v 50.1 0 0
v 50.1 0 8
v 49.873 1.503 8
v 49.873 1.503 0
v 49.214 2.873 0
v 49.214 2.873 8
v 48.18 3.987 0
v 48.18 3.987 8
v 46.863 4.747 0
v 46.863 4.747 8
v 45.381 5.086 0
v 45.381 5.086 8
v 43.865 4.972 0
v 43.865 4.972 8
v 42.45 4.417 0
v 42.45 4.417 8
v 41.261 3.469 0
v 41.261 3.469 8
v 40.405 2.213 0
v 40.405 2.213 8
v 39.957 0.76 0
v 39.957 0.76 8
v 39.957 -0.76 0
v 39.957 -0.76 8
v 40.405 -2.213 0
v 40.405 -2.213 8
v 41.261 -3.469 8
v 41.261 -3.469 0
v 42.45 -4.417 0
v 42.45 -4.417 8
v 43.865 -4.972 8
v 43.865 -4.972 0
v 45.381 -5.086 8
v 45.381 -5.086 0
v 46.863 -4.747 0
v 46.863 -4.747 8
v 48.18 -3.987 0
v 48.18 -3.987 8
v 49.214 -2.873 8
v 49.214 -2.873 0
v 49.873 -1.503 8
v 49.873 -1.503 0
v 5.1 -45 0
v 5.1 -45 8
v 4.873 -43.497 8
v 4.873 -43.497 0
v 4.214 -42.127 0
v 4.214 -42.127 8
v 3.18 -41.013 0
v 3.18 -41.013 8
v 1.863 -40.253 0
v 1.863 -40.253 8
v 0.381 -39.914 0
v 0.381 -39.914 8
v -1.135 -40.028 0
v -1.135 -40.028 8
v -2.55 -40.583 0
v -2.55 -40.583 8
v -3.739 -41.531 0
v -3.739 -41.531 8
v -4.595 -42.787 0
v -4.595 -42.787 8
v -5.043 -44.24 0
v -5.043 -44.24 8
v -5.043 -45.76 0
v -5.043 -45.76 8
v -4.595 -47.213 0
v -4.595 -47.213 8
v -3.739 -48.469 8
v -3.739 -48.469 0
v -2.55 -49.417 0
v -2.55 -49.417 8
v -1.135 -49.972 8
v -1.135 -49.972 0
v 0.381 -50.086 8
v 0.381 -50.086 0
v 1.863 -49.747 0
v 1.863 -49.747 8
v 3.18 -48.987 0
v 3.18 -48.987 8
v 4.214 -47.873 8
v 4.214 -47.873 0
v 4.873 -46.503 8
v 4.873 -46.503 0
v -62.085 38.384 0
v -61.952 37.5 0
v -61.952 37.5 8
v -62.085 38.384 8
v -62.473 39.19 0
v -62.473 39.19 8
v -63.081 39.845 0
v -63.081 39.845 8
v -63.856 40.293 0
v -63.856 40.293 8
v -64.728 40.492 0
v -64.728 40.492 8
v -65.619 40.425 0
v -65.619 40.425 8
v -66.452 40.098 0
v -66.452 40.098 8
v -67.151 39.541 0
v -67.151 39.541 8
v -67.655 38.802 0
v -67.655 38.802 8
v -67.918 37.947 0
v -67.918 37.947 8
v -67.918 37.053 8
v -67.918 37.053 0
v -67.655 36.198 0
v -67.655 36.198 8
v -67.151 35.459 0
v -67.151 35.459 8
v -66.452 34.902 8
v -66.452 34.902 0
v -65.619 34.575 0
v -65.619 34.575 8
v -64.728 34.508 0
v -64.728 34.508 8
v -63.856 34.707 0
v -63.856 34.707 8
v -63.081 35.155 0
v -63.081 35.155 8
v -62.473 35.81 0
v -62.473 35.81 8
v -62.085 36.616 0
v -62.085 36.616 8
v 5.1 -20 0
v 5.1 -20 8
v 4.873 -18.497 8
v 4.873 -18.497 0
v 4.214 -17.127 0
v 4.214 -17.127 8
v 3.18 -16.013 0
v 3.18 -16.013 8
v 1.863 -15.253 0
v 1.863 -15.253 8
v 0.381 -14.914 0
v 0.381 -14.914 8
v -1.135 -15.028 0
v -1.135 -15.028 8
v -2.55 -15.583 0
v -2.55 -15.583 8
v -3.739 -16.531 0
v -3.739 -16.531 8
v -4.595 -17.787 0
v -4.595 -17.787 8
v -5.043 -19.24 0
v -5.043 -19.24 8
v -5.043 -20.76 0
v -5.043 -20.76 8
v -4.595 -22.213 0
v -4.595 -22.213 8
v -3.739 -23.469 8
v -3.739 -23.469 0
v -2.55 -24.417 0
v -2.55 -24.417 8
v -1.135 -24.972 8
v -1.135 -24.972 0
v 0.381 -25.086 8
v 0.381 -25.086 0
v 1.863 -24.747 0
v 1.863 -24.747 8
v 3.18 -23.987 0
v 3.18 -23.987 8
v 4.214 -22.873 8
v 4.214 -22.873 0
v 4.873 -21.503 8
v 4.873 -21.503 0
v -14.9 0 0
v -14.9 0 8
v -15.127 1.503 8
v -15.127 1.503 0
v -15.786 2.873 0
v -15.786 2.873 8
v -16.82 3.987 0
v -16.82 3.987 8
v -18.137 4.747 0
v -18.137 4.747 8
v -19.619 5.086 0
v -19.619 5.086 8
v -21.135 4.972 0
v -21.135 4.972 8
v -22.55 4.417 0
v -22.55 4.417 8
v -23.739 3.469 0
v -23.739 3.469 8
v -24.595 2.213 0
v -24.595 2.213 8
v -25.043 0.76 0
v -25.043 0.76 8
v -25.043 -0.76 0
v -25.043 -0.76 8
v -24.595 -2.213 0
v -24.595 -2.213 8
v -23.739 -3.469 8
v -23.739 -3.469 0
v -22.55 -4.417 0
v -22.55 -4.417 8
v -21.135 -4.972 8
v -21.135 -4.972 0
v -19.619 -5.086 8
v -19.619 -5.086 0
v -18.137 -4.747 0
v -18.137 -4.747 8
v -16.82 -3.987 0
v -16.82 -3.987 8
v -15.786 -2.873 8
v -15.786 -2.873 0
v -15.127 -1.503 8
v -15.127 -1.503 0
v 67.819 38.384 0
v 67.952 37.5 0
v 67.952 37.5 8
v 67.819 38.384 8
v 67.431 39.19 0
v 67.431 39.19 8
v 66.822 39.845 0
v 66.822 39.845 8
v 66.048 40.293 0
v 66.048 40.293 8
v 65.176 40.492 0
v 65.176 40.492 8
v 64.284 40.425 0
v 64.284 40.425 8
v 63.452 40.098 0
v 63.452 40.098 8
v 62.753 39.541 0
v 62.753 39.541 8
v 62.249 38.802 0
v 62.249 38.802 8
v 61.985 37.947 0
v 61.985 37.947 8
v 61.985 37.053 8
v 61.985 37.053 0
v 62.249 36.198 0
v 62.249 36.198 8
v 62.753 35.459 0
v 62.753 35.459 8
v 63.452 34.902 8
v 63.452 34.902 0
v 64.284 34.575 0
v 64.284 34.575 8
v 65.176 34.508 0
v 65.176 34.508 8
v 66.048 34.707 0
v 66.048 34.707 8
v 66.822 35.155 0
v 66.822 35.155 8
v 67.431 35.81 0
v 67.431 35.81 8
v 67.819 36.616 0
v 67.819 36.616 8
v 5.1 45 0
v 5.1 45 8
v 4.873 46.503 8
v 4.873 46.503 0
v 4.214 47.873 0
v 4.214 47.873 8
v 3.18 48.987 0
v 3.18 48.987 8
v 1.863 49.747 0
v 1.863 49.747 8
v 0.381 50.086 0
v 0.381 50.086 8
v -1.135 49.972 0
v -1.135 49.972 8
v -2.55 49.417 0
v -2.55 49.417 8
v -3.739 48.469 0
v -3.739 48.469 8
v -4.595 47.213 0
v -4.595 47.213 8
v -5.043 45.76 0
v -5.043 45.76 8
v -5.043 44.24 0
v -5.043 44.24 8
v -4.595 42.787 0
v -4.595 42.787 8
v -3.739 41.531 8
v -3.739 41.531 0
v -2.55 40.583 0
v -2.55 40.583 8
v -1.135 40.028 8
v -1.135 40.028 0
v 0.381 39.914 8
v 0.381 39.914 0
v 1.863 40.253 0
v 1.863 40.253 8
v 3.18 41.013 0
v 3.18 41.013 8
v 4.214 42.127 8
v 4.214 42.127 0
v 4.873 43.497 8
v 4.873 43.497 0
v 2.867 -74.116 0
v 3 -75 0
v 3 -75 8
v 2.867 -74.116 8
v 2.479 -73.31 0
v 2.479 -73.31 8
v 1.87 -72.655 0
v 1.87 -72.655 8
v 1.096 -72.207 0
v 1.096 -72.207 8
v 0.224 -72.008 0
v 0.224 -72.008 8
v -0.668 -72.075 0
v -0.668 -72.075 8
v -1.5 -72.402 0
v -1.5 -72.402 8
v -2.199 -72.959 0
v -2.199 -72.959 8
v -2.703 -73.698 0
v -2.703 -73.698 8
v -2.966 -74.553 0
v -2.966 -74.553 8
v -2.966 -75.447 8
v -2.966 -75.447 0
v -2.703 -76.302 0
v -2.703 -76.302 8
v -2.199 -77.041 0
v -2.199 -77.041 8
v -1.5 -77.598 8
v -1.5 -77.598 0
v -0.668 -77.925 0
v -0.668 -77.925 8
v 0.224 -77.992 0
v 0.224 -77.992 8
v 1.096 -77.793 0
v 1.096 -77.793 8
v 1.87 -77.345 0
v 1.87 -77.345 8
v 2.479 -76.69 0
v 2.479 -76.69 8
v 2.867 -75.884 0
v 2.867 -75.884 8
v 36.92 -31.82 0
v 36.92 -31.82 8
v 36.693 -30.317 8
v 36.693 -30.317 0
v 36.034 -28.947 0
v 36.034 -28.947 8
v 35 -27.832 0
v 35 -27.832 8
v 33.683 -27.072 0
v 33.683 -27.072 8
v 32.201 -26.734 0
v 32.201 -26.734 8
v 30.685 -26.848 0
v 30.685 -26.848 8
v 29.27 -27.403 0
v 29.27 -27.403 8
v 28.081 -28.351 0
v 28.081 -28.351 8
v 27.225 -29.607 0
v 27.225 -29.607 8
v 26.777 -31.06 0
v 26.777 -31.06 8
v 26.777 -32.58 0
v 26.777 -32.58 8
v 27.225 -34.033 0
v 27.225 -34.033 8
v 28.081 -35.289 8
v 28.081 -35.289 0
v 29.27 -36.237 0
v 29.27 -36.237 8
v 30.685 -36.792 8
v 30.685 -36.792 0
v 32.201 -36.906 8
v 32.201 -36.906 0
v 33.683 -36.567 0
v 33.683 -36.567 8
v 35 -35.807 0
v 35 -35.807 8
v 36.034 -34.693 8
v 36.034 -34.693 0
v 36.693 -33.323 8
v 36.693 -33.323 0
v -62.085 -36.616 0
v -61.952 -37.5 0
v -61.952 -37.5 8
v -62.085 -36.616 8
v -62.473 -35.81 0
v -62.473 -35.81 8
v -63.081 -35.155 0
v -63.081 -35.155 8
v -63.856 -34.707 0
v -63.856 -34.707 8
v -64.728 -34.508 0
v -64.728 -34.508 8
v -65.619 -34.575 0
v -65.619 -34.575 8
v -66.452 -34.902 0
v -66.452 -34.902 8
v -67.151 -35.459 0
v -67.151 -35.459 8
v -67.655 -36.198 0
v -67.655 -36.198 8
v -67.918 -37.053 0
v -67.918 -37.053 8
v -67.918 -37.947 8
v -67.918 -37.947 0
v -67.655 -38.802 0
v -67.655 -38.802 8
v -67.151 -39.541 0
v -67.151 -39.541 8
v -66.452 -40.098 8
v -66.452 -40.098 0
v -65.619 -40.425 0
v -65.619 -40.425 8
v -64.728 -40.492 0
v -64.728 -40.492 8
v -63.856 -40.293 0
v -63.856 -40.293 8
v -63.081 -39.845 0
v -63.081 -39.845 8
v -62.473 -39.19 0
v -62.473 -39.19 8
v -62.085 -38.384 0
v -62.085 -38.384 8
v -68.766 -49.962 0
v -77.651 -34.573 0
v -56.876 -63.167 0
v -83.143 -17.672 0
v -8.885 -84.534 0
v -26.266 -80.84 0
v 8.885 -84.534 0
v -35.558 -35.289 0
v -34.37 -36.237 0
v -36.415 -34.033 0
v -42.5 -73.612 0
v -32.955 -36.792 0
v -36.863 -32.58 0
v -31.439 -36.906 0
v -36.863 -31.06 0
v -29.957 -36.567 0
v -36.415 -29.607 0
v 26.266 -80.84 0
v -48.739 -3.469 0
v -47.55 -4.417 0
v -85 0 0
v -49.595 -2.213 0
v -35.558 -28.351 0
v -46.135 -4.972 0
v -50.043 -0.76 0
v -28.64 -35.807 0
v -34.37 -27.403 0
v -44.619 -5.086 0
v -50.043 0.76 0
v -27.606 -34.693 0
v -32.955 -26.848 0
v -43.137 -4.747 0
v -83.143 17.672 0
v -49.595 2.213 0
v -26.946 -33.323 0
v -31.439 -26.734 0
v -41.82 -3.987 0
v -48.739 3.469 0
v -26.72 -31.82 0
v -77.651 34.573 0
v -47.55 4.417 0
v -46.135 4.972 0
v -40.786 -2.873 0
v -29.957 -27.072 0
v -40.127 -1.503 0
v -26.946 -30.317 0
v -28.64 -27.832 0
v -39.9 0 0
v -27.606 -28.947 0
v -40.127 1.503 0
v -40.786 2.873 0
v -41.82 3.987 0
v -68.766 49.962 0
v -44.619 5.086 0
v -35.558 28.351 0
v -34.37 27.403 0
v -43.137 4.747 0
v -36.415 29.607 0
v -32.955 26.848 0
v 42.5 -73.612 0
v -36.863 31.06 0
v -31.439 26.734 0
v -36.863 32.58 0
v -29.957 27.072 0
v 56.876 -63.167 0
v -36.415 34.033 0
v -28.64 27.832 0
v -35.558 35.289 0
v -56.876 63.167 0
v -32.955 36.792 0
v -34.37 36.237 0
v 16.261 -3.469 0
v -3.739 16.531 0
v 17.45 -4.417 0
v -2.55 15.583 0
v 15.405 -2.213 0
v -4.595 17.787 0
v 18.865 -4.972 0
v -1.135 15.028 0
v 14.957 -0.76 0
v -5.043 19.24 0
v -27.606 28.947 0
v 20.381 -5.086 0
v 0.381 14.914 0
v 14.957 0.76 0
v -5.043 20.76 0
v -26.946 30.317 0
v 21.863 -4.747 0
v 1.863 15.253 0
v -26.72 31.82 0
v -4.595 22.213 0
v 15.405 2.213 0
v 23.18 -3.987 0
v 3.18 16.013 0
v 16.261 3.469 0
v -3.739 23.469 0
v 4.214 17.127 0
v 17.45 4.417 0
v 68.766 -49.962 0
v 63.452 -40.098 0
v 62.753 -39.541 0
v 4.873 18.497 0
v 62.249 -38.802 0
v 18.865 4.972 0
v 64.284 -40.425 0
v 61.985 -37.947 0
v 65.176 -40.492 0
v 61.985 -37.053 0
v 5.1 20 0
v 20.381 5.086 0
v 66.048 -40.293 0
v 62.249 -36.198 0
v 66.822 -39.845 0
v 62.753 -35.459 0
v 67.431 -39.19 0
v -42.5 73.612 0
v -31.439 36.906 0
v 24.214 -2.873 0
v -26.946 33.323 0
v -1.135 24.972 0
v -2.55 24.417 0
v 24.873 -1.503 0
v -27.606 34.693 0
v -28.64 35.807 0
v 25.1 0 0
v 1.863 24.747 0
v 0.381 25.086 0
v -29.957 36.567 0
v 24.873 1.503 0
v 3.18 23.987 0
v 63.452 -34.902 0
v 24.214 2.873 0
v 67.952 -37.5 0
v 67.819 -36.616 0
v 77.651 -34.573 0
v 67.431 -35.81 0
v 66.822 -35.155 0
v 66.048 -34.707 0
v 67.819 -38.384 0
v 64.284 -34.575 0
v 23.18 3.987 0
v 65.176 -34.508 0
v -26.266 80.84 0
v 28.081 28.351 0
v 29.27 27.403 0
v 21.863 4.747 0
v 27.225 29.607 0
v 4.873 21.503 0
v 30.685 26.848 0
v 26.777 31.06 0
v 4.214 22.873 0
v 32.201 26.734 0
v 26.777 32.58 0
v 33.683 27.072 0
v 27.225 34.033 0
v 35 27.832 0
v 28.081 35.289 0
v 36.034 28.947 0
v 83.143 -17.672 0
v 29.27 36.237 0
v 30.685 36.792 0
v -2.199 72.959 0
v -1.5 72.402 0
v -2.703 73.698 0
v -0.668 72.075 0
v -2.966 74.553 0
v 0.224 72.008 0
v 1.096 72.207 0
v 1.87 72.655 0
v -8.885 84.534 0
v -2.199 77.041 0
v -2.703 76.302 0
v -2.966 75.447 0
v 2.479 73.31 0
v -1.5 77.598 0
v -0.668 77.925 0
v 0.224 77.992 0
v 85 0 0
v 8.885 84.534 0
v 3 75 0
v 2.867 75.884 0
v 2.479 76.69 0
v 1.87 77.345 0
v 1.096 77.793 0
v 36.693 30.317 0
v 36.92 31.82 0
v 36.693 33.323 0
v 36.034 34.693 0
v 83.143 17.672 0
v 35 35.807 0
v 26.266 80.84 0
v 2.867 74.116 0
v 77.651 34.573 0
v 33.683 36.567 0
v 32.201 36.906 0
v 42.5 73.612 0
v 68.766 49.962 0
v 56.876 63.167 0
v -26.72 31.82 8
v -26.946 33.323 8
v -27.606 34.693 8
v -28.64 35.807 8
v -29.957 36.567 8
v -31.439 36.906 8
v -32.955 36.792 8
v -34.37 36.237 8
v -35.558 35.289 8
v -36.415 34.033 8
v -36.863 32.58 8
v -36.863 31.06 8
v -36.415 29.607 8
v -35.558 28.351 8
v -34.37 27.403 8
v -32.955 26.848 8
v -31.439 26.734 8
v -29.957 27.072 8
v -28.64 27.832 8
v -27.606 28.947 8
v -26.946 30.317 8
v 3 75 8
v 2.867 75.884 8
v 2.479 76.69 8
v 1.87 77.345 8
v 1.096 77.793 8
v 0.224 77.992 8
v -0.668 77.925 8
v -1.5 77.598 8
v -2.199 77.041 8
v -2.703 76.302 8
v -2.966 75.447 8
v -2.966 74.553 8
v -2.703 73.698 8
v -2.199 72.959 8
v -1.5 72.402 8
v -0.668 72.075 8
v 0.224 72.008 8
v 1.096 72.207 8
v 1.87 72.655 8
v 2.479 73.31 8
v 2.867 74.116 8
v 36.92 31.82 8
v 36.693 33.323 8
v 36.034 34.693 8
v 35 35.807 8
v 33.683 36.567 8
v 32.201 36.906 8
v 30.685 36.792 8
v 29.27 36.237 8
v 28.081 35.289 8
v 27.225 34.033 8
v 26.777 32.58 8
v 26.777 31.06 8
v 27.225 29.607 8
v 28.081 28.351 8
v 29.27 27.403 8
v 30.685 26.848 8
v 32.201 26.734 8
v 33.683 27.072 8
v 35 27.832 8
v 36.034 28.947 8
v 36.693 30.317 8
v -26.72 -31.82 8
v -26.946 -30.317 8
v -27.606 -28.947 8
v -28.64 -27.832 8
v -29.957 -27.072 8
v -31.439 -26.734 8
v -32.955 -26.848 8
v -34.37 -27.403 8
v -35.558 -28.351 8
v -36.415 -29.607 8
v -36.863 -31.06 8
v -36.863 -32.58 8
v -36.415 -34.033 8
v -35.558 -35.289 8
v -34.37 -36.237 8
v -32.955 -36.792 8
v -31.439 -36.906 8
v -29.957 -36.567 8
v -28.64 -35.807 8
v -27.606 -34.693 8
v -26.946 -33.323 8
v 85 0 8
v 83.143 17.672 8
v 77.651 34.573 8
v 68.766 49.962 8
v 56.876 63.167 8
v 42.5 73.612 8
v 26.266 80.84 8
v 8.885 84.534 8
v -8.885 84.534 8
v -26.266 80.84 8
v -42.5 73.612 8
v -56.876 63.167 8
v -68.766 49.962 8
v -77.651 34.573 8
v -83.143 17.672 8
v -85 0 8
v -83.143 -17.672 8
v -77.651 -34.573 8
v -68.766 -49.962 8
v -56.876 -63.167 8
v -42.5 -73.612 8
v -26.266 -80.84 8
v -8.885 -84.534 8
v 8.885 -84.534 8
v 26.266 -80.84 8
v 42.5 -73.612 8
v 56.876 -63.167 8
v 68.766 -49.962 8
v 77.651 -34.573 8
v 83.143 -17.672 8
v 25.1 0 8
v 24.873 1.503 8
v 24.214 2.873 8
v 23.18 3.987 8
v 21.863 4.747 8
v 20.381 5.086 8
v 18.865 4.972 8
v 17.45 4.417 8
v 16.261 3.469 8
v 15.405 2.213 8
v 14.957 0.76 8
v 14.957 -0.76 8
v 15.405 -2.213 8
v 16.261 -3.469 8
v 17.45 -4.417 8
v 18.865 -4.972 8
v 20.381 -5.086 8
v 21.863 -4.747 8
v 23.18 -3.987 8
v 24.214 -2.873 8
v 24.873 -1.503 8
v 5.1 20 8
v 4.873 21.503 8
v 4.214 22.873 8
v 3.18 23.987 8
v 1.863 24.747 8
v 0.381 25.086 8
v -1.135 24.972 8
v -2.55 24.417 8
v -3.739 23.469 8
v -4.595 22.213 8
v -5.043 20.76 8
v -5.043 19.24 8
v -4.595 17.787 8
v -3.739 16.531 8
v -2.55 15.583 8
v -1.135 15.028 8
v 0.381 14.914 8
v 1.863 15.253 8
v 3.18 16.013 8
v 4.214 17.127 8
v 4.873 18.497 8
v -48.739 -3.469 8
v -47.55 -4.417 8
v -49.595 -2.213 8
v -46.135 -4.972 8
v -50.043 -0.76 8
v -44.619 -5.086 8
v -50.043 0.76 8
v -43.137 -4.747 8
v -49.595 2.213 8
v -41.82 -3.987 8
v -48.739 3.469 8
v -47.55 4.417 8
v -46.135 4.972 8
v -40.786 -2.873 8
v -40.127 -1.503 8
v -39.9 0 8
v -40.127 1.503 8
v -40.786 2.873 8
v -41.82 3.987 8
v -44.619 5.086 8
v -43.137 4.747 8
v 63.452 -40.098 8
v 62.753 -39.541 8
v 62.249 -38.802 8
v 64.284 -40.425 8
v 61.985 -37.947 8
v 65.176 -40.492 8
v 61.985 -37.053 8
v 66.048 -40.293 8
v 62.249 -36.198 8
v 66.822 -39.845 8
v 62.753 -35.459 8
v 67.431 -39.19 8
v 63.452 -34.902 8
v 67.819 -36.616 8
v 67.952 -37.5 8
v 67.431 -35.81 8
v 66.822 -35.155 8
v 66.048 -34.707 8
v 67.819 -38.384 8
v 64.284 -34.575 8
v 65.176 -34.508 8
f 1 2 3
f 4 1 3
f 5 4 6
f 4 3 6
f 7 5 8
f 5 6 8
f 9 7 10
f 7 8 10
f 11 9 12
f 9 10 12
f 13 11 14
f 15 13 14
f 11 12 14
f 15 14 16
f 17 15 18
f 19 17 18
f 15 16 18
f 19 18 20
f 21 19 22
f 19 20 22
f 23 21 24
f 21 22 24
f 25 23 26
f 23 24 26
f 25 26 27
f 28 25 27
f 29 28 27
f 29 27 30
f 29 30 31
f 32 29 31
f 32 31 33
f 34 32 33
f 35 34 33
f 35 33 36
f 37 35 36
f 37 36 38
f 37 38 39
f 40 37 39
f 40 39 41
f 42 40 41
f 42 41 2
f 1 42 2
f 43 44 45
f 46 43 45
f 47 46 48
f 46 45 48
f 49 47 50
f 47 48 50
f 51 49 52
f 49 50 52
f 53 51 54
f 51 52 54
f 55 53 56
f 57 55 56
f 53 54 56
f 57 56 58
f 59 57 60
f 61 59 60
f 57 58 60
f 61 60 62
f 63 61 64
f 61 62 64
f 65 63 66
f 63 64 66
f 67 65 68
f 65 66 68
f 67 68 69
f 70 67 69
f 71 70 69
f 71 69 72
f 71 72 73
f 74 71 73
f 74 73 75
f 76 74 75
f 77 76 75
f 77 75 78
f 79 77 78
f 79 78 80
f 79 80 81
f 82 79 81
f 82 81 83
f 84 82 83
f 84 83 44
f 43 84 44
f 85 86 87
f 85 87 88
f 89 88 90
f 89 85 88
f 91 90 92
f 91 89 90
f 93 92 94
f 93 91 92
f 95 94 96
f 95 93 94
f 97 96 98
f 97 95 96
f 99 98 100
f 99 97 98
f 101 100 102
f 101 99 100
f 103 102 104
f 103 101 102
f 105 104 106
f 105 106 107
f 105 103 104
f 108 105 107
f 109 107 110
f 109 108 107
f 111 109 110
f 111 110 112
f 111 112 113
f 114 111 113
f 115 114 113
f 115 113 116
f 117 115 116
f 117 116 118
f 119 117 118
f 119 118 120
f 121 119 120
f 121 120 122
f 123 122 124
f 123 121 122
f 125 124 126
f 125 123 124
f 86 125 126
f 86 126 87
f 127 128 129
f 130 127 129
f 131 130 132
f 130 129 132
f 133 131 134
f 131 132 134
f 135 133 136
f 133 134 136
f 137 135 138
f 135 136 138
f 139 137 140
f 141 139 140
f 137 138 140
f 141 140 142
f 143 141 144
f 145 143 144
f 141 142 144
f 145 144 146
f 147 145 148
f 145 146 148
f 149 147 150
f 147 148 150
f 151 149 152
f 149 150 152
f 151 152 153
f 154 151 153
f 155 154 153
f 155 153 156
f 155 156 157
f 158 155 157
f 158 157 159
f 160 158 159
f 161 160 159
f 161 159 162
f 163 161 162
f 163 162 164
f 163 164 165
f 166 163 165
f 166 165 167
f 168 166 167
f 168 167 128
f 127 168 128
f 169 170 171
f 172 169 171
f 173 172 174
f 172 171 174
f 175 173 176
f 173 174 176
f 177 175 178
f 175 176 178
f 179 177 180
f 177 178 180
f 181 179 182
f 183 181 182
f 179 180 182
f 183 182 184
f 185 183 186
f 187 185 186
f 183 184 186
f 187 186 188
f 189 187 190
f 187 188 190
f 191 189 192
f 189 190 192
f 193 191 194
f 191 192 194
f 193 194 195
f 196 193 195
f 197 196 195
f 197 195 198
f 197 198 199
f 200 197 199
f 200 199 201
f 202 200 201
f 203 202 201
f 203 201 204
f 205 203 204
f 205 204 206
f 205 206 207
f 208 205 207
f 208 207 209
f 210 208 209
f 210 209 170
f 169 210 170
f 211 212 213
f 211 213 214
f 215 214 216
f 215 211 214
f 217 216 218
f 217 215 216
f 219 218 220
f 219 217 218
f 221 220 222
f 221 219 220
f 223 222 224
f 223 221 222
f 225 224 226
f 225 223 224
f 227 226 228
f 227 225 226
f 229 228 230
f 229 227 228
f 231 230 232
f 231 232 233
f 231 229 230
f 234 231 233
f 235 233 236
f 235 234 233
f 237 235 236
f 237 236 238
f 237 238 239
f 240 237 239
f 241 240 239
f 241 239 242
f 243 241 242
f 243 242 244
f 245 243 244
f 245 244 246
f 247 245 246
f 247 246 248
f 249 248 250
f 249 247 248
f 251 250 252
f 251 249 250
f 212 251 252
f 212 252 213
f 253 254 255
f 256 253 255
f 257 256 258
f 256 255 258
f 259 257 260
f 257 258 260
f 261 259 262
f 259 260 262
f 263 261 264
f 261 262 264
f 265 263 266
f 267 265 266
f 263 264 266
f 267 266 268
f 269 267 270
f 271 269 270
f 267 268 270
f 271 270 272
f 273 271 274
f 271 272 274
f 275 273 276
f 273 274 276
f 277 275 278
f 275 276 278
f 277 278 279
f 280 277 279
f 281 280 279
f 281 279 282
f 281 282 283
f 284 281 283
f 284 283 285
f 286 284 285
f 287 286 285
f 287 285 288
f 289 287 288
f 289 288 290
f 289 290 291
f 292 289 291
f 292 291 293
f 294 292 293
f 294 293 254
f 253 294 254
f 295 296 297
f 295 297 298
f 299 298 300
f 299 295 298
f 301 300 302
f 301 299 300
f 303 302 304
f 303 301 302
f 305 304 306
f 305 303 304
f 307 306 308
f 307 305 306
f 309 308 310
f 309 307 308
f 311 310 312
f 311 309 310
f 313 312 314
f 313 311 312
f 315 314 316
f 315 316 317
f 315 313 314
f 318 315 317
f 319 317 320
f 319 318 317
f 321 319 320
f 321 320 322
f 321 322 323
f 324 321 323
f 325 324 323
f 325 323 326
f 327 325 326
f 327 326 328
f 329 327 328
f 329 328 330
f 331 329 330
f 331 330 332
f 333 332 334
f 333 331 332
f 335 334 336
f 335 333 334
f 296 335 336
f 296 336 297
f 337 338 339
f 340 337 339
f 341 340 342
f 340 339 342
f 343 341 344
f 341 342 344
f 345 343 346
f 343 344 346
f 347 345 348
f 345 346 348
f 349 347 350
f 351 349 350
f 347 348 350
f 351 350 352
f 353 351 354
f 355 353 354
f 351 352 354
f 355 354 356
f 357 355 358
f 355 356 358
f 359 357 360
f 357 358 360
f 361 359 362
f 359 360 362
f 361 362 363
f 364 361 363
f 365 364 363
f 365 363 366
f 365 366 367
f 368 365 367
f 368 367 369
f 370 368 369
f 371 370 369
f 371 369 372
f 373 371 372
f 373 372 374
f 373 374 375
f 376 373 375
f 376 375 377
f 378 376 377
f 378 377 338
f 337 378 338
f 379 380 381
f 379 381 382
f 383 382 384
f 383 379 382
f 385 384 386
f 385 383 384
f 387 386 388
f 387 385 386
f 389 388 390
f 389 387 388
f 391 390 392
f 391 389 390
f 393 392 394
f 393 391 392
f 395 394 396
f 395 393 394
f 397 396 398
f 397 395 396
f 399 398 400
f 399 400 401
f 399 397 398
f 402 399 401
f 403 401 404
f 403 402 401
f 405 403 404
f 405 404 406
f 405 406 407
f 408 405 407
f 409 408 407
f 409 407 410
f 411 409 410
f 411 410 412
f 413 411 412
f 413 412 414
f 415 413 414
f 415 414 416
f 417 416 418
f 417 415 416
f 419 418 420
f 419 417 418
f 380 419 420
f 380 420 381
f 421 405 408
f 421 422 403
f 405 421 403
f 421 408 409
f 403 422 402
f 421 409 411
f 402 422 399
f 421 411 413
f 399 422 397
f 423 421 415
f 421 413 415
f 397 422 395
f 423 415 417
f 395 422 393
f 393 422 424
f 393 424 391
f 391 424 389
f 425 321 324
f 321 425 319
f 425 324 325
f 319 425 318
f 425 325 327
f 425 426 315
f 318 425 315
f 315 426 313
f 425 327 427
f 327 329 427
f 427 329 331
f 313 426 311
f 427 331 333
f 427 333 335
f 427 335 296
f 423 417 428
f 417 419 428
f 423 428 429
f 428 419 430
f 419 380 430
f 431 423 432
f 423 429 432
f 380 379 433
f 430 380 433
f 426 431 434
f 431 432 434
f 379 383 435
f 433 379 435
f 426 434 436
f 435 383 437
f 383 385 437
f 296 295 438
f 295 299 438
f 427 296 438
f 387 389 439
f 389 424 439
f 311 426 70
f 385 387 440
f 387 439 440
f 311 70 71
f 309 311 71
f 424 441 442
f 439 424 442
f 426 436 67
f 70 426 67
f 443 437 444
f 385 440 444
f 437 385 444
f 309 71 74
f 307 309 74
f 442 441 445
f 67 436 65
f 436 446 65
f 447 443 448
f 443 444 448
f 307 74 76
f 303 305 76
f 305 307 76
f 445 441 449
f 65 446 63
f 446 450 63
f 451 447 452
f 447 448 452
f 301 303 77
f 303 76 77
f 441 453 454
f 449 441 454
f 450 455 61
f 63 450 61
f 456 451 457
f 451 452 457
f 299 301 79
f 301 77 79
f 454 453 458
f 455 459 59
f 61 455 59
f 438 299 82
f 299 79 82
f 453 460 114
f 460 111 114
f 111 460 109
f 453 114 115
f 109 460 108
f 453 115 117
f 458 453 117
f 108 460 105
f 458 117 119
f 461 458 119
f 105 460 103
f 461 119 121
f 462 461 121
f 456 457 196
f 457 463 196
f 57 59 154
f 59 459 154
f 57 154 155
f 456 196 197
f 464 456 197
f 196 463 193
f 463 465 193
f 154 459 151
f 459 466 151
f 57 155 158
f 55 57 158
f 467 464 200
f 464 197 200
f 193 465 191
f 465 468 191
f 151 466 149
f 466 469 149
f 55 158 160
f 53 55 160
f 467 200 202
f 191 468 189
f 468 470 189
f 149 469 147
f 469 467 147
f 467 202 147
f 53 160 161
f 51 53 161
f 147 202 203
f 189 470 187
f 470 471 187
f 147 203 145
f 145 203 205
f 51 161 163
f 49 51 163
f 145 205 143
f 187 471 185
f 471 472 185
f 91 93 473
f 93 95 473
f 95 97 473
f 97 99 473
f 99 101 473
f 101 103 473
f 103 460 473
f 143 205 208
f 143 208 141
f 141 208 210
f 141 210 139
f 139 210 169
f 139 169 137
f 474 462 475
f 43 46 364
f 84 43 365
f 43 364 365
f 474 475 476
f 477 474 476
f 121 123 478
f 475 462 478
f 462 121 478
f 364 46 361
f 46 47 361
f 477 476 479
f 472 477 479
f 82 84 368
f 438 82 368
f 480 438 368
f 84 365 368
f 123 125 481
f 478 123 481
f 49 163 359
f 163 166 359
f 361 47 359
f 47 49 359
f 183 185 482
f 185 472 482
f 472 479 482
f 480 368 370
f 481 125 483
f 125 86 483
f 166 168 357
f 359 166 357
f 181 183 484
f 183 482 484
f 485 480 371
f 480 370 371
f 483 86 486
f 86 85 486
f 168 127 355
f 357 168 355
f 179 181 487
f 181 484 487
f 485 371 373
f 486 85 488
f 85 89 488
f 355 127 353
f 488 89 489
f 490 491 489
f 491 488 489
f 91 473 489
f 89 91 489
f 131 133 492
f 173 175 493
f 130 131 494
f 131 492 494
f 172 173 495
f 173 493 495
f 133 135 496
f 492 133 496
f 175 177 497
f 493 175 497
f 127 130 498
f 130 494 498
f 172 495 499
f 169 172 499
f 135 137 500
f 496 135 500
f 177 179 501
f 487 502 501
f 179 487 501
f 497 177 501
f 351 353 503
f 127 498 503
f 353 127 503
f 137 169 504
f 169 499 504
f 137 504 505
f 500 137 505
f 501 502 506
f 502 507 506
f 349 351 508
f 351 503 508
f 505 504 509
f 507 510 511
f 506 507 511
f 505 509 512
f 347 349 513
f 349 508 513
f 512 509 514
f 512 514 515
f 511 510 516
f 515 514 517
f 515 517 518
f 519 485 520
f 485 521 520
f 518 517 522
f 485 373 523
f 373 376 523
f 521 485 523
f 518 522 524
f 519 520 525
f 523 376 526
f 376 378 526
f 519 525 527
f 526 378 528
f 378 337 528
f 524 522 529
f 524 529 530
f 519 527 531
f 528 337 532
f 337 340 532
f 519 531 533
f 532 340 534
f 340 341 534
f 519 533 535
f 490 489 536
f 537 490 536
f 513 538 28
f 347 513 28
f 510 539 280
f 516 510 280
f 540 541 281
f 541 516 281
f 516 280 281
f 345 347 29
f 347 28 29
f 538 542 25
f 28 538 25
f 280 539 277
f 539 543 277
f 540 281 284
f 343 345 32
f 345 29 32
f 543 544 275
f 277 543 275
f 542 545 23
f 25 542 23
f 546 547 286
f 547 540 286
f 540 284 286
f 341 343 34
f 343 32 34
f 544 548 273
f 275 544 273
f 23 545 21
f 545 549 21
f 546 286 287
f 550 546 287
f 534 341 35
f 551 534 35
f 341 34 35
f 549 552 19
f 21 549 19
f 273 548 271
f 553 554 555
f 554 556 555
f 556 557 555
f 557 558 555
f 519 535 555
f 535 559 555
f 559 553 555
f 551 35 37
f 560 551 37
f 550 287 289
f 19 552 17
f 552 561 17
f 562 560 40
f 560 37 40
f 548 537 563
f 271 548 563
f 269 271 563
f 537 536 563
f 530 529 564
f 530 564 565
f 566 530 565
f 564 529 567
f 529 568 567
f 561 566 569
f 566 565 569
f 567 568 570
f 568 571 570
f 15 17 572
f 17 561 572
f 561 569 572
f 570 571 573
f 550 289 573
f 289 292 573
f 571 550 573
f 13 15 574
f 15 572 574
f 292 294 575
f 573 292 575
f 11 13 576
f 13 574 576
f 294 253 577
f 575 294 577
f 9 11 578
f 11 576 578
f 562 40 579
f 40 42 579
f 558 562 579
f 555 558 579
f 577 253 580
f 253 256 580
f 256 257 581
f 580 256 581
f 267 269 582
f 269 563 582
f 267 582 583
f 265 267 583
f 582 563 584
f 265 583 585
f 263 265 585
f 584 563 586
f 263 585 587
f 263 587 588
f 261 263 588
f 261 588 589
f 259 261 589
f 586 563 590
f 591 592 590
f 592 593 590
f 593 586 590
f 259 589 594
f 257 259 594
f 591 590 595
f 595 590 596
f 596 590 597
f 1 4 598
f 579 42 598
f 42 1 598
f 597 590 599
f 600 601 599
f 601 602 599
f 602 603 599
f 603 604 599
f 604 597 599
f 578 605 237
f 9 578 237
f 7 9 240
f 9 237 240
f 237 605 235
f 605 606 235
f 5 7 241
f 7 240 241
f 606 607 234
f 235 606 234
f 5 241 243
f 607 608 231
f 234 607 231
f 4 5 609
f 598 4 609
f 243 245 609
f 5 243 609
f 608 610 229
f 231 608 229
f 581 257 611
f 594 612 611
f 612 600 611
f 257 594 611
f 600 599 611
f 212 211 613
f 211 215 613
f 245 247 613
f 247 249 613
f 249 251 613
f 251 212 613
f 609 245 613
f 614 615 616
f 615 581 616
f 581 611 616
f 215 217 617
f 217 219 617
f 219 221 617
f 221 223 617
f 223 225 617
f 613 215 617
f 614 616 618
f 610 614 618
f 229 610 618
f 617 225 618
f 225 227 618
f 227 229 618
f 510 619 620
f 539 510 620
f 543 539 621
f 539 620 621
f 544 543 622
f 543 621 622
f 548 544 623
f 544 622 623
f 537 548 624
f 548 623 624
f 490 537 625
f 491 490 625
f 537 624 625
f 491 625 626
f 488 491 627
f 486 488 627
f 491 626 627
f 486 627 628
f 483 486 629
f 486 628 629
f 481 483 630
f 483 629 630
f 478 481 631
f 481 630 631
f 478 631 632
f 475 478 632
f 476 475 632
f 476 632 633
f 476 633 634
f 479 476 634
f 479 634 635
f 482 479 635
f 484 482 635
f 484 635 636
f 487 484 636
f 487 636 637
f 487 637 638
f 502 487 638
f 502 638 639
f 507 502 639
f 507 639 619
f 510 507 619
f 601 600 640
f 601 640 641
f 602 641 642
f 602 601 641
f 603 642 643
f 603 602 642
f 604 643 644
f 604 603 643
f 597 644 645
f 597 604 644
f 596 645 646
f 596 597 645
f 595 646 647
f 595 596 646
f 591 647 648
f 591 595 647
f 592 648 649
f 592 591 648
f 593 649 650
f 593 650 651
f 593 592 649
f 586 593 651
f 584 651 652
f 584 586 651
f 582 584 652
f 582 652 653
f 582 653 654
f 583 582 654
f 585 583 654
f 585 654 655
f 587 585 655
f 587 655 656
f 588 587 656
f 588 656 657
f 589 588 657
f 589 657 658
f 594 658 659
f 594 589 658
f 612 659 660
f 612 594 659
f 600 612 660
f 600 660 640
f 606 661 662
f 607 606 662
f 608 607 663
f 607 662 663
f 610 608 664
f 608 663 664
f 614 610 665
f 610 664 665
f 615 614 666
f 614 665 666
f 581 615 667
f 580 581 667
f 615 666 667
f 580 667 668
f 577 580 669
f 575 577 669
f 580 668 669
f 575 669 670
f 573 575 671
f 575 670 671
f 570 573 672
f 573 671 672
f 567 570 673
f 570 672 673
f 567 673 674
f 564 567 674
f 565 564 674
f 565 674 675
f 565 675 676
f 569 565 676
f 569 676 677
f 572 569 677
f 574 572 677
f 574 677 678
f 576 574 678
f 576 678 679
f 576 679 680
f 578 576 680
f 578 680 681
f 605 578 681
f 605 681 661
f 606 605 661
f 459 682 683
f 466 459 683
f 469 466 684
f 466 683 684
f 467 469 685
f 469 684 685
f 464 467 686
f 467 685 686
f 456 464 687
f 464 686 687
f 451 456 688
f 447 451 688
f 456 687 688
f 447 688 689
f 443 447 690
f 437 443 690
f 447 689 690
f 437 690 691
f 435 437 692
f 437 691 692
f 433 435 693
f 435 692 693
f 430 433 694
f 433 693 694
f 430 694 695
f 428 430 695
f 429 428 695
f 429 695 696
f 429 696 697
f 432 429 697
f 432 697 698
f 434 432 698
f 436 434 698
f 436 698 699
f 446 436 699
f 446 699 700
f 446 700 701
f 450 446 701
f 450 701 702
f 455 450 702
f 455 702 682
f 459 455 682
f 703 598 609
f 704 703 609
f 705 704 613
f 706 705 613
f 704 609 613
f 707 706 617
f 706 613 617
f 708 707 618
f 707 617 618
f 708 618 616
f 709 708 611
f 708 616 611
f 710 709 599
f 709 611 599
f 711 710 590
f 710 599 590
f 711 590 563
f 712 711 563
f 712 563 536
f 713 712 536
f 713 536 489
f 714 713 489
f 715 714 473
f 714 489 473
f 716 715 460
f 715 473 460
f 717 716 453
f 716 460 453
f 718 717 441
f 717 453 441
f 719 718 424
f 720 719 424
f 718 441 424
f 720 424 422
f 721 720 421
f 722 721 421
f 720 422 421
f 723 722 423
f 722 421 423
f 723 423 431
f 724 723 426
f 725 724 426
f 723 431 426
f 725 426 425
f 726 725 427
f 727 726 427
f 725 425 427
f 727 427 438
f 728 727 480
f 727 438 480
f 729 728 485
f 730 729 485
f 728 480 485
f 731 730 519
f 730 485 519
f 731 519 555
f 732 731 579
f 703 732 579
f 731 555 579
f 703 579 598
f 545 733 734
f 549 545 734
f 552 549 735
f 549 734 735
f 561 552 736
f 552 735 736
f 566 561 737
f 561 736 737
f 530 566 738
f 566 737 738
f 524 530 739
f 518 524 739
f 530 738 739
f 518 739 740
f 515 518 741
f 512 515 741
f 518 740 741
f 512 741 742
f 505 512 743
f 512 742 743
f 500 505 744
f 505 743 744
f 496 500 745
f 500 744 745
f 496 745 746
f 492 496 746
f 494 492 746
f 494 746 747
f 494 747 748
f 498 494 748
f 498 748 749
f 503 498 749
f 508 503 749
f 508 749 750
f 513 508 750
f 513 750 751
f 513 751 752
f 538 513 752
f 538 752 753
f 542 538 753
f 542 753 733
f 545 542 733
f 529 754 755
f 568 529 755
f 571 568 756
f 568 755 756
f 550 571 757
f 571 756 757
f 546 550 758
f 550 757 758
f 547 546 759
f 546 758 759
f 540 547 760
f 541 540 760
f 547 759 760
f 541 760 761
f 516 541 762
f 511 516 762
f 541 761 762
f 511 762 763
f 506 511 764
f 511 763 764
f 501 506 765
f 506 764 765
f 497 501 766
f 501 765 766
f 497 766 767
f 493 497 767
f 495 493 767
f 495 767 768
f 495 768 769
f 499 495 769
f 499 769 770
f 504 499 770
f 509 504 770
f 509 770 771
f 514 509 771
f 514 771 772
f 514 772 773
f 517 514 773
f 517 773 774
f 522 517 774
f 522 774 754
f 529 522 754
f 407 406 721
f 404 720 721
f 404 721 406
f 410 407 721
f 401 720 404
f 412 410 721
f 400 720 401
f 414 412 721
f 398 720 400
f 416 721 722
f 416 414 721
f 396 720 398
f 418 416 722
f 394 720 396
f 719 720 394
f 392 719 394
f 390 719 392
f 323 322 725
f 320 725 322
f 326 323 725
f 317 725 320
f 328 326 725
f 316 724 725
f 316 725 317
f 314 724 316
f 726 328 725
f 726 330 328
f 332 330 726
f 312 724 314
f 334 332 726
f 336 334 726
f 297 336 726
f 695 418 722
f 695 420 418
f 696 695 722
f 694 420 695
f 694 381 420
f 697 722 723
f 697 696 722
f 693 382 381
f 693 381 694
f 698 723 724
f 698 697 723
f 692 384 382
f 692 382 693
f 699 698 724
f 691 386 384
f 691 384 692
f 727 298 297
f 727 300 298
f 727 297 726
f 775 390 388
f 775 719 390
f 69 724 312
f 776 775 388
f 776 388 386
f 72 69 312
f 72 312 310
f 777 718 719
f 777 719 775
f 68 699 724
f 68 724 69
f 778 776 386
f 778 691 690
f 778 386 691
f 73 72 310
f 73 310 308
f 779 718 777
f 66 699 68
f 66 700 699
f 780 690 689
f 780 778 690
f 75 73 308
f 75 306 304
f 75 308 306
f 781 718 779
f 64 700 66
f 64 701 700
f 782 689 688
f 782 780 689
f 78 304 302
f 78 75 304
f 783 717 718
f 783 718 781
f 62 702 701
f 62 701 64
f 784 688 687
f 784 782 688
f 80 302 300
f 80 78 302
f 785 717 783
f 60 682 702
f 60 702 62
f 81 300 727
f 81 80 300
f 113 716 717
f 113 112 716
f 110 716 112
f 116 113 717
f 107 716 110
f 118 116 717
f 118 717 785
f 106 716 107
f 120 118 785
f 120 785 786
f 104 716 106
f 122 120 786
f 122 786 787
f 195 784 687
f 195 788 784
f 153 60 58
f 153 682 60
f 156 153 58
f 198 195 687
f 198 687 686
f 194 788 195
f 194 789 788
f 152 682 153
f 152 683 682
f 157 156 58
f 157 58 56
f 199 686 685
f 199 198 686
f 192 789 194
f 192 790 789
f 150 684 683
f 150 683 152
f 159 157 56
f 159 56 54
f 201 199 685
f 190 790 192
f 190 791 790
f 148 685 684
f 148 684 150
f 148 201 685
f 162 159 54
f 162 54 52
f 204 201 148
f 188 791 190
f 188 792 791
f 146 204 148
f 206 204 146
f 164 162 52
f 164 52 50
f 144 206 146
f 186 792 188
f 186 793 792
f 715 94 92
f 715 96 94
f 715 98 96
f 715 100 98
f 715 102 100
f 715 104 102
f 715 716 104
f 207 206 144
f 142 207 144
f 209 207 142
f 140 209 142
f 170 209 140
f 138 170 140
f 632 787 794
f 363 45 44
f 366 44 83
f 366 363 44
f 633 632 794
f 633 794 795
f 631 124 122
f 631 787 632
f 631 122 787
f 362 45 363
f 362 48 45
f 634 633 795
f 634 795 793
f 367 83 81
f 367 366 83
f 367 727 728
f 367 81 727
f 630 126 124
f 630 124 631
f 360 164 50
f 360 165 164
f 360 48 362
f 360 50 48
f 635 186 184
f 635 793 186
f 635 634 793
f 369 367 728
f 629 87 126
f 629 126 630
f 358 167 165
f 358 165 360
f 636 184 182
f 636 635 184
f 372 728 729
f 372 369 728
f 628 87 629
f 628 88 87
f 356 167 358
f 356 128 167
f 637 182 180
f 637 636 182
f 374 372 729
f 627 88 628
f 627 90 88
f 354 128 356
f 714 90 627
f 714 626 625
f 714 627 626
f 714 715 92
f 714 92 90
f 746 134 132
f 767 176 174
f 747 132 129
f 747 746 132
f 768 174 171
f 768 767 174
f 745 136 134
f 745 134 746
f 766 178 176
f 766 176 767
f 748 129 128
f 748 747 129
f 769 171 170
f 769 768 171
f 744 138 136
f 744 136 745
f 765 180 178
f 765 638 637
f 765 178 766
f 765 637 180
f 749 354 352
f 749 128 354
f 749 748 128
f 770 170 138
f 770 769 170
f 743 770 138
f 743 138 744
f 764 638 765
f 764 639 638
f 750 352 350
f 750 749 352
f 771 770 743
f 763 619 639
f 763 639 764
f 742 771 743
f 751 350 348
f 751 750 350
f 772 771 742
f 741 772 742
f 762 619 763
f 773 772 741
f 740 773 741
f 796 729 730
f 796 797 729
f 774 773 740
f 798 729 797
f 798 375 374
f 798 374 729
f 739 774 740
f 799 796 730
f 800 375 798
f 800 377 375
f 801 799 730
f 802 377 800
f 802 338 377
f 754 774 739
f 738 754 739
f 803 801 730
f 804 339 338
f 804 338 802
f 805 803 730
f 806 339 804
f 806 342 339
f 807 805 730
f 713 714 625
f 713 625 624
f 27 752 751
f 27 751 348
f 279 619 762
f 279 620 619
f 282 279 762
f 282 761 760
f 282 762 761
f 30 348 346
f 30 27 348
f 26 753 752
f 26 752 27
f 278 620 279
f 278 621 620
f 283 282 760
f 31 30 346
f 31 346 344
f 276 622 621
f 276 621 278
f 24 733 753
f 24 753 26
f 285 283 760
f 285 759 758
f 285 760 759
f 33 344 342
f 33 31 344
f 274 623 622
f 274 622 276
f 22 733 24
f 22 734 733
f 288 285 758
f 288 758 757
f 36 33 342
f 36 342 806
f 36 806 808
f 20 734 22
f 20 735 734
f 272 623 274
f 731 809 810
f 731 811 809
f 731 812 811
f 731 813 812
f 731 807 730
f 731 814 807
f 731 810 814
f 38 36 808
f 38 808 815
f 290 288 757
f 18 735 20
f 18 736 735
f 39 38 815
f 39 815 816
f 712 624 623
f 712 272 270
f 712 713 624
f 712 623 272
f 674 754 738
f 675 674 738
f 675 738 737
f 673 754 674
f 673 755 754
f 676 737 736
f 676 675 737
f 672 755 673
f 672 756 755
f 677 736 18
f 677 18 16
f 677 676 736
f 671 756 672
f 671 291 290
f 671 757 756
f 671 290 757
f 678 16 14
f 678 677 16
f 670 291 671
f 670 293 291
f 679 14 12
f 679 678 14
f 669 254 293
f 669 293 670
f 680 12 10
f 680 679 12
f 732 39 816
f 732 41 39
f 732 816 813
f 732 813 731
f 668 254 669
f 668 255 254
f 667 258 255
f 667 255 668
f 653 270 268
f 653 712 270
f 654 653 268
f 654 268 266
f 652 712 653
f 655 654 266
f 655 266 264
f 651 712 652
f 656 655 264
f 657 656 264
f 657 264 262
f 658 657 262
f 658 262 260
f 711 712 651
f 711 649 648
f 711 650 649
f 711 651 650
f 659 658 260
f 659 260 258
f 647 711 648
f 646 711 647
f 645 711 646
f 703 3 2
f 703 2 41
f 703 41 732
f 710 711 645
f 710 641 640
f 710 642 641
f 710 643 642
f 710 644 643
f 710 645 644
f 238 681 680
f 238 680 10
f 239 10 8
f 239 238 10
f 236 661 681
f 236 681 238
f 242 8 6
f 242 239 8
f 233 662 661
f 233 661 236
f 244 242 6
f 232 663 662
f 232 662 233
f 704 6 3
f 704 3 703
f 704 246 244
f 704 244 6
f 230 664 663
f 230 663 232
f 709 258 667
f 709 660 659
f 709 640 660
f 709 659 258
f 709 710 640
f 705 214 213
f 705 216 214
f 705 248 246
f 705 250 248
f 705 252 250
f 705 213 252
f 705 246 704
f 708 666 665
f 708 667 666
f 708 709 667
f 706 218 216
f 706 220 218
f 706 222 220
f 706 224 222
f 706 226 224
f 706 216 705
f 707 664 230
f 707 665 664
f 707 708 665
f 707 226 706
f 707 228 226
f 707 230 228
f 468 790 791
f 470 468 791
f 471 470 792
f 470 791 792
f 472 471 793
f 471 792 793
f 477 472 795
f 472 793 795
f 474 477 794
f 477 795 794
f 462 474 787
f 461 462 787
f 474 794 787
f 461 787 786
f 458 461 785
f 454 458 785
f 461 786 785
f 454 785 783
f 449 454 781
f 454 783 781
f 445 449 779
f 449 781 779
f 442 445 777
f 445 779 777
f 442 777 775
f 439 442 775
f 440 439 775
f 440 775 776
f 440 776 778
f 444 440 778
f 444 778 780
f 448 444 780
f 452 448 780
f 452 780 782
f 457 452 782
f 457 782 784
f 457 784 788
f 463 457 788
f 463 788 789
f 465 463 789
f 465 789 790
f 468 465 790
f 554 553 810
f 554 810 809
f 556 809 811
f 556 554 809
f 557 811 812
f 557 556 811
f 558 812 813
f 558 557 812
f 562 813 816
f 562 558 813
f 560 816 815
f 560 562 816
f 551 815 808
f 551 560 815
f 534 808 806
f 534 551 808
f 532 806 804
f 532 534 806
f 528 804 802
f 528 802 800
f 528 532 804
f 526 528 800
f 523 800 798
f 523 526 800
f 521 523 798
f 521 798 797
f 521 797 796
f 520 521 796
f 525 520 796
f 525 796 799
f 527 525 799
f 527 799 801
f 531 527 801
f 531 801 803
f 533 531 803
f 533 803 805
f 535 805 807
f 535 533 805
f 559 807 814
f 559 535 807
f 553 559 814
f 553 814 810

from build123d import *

# Parameters (mm, degrees)
SKETCH_1_R          = 85
SKETCH_1_R_2        = 3
EXTRUDE_1_DEPTH     = 8
SKETCH_2_R          = 5.1
CUT_EXTRUDE_1_DEPTH = 121.474063599


with BuildPart() as part:
    # 草图1 → 凸台-拉伸1 (new body)
    with BuildSketch(Plane.XY):
        Circle(SKETCH_1_R)
        with Locations((0, 75)):
            Circle(SKETCH_1_R_2, mode=Mode.SUBTRACT)
        with Locations((64.951905284, 37.5)):
            Circle(SKETCH_1_R_2, mode=Mode.SUBTRACT)
        with Locations((64.951905284, -37.5)):
            Circle(SKETCH_1_R_2, mode=Mode.SUBTRACT)
        with Locations((0, -75)):
            Circle(SKETCH_1_R_2, mode=Mode.SUBTRACT)
        with Locations((-64.951905284, -37.5)):
            Circle(SKETCH_1_R_2, mode=Mode.SUBTRACT)
        with Locations((-64.951905284, 37.5)):
            Circle(SKETCH_1_R_2, mode=Mode.SUBTRACT)
    extrude(amount=EXTRUDE_1_DEPTH)

    # 草图2 → 切除-拉伸1 (cut, through all)
    with BuildSketch(Plane.XY.offset(8)):
        with Locations((0, 45)):
            Circle(SKETCH_2_R)
        with Locations((31.819805153, 31.819805153)):
            Circle(SKETCH_2_R)
        with Locations((45, 0)):
            Circle(SKETCH_2_R)
        with Locations((31.819805153, -31.819805153)):
            Circle(SKETCH_2_R)
        with Locations((0, -45)):
            Circle(SKETCH_2_R)
        with Locations((-31.819805153, -31.819805153)):
            Circle(SKETCH_2_R)
        with Locations((-45, 0)):
            Circle(SKETCH_2_R)
        with Locations((-31.819805153, 31.819805153)):
            Circle(SKETCH_2_R)
        with Locations((0, 20)):
            Circle(SKETCH_2_R)
        with Locations((20, 0)):
            Circle(SKETCH_2_R)
        with Locations((0, -20)):
            Circle(SKETCH_2_R)
        with Locations((-20, 0)):
            Circle(SKETCH_2_R)
    extrude(amount=-CUT_EXTRUDE_1_DEPTH, mode=Mode.SUBTRACT)


solid = part.part
